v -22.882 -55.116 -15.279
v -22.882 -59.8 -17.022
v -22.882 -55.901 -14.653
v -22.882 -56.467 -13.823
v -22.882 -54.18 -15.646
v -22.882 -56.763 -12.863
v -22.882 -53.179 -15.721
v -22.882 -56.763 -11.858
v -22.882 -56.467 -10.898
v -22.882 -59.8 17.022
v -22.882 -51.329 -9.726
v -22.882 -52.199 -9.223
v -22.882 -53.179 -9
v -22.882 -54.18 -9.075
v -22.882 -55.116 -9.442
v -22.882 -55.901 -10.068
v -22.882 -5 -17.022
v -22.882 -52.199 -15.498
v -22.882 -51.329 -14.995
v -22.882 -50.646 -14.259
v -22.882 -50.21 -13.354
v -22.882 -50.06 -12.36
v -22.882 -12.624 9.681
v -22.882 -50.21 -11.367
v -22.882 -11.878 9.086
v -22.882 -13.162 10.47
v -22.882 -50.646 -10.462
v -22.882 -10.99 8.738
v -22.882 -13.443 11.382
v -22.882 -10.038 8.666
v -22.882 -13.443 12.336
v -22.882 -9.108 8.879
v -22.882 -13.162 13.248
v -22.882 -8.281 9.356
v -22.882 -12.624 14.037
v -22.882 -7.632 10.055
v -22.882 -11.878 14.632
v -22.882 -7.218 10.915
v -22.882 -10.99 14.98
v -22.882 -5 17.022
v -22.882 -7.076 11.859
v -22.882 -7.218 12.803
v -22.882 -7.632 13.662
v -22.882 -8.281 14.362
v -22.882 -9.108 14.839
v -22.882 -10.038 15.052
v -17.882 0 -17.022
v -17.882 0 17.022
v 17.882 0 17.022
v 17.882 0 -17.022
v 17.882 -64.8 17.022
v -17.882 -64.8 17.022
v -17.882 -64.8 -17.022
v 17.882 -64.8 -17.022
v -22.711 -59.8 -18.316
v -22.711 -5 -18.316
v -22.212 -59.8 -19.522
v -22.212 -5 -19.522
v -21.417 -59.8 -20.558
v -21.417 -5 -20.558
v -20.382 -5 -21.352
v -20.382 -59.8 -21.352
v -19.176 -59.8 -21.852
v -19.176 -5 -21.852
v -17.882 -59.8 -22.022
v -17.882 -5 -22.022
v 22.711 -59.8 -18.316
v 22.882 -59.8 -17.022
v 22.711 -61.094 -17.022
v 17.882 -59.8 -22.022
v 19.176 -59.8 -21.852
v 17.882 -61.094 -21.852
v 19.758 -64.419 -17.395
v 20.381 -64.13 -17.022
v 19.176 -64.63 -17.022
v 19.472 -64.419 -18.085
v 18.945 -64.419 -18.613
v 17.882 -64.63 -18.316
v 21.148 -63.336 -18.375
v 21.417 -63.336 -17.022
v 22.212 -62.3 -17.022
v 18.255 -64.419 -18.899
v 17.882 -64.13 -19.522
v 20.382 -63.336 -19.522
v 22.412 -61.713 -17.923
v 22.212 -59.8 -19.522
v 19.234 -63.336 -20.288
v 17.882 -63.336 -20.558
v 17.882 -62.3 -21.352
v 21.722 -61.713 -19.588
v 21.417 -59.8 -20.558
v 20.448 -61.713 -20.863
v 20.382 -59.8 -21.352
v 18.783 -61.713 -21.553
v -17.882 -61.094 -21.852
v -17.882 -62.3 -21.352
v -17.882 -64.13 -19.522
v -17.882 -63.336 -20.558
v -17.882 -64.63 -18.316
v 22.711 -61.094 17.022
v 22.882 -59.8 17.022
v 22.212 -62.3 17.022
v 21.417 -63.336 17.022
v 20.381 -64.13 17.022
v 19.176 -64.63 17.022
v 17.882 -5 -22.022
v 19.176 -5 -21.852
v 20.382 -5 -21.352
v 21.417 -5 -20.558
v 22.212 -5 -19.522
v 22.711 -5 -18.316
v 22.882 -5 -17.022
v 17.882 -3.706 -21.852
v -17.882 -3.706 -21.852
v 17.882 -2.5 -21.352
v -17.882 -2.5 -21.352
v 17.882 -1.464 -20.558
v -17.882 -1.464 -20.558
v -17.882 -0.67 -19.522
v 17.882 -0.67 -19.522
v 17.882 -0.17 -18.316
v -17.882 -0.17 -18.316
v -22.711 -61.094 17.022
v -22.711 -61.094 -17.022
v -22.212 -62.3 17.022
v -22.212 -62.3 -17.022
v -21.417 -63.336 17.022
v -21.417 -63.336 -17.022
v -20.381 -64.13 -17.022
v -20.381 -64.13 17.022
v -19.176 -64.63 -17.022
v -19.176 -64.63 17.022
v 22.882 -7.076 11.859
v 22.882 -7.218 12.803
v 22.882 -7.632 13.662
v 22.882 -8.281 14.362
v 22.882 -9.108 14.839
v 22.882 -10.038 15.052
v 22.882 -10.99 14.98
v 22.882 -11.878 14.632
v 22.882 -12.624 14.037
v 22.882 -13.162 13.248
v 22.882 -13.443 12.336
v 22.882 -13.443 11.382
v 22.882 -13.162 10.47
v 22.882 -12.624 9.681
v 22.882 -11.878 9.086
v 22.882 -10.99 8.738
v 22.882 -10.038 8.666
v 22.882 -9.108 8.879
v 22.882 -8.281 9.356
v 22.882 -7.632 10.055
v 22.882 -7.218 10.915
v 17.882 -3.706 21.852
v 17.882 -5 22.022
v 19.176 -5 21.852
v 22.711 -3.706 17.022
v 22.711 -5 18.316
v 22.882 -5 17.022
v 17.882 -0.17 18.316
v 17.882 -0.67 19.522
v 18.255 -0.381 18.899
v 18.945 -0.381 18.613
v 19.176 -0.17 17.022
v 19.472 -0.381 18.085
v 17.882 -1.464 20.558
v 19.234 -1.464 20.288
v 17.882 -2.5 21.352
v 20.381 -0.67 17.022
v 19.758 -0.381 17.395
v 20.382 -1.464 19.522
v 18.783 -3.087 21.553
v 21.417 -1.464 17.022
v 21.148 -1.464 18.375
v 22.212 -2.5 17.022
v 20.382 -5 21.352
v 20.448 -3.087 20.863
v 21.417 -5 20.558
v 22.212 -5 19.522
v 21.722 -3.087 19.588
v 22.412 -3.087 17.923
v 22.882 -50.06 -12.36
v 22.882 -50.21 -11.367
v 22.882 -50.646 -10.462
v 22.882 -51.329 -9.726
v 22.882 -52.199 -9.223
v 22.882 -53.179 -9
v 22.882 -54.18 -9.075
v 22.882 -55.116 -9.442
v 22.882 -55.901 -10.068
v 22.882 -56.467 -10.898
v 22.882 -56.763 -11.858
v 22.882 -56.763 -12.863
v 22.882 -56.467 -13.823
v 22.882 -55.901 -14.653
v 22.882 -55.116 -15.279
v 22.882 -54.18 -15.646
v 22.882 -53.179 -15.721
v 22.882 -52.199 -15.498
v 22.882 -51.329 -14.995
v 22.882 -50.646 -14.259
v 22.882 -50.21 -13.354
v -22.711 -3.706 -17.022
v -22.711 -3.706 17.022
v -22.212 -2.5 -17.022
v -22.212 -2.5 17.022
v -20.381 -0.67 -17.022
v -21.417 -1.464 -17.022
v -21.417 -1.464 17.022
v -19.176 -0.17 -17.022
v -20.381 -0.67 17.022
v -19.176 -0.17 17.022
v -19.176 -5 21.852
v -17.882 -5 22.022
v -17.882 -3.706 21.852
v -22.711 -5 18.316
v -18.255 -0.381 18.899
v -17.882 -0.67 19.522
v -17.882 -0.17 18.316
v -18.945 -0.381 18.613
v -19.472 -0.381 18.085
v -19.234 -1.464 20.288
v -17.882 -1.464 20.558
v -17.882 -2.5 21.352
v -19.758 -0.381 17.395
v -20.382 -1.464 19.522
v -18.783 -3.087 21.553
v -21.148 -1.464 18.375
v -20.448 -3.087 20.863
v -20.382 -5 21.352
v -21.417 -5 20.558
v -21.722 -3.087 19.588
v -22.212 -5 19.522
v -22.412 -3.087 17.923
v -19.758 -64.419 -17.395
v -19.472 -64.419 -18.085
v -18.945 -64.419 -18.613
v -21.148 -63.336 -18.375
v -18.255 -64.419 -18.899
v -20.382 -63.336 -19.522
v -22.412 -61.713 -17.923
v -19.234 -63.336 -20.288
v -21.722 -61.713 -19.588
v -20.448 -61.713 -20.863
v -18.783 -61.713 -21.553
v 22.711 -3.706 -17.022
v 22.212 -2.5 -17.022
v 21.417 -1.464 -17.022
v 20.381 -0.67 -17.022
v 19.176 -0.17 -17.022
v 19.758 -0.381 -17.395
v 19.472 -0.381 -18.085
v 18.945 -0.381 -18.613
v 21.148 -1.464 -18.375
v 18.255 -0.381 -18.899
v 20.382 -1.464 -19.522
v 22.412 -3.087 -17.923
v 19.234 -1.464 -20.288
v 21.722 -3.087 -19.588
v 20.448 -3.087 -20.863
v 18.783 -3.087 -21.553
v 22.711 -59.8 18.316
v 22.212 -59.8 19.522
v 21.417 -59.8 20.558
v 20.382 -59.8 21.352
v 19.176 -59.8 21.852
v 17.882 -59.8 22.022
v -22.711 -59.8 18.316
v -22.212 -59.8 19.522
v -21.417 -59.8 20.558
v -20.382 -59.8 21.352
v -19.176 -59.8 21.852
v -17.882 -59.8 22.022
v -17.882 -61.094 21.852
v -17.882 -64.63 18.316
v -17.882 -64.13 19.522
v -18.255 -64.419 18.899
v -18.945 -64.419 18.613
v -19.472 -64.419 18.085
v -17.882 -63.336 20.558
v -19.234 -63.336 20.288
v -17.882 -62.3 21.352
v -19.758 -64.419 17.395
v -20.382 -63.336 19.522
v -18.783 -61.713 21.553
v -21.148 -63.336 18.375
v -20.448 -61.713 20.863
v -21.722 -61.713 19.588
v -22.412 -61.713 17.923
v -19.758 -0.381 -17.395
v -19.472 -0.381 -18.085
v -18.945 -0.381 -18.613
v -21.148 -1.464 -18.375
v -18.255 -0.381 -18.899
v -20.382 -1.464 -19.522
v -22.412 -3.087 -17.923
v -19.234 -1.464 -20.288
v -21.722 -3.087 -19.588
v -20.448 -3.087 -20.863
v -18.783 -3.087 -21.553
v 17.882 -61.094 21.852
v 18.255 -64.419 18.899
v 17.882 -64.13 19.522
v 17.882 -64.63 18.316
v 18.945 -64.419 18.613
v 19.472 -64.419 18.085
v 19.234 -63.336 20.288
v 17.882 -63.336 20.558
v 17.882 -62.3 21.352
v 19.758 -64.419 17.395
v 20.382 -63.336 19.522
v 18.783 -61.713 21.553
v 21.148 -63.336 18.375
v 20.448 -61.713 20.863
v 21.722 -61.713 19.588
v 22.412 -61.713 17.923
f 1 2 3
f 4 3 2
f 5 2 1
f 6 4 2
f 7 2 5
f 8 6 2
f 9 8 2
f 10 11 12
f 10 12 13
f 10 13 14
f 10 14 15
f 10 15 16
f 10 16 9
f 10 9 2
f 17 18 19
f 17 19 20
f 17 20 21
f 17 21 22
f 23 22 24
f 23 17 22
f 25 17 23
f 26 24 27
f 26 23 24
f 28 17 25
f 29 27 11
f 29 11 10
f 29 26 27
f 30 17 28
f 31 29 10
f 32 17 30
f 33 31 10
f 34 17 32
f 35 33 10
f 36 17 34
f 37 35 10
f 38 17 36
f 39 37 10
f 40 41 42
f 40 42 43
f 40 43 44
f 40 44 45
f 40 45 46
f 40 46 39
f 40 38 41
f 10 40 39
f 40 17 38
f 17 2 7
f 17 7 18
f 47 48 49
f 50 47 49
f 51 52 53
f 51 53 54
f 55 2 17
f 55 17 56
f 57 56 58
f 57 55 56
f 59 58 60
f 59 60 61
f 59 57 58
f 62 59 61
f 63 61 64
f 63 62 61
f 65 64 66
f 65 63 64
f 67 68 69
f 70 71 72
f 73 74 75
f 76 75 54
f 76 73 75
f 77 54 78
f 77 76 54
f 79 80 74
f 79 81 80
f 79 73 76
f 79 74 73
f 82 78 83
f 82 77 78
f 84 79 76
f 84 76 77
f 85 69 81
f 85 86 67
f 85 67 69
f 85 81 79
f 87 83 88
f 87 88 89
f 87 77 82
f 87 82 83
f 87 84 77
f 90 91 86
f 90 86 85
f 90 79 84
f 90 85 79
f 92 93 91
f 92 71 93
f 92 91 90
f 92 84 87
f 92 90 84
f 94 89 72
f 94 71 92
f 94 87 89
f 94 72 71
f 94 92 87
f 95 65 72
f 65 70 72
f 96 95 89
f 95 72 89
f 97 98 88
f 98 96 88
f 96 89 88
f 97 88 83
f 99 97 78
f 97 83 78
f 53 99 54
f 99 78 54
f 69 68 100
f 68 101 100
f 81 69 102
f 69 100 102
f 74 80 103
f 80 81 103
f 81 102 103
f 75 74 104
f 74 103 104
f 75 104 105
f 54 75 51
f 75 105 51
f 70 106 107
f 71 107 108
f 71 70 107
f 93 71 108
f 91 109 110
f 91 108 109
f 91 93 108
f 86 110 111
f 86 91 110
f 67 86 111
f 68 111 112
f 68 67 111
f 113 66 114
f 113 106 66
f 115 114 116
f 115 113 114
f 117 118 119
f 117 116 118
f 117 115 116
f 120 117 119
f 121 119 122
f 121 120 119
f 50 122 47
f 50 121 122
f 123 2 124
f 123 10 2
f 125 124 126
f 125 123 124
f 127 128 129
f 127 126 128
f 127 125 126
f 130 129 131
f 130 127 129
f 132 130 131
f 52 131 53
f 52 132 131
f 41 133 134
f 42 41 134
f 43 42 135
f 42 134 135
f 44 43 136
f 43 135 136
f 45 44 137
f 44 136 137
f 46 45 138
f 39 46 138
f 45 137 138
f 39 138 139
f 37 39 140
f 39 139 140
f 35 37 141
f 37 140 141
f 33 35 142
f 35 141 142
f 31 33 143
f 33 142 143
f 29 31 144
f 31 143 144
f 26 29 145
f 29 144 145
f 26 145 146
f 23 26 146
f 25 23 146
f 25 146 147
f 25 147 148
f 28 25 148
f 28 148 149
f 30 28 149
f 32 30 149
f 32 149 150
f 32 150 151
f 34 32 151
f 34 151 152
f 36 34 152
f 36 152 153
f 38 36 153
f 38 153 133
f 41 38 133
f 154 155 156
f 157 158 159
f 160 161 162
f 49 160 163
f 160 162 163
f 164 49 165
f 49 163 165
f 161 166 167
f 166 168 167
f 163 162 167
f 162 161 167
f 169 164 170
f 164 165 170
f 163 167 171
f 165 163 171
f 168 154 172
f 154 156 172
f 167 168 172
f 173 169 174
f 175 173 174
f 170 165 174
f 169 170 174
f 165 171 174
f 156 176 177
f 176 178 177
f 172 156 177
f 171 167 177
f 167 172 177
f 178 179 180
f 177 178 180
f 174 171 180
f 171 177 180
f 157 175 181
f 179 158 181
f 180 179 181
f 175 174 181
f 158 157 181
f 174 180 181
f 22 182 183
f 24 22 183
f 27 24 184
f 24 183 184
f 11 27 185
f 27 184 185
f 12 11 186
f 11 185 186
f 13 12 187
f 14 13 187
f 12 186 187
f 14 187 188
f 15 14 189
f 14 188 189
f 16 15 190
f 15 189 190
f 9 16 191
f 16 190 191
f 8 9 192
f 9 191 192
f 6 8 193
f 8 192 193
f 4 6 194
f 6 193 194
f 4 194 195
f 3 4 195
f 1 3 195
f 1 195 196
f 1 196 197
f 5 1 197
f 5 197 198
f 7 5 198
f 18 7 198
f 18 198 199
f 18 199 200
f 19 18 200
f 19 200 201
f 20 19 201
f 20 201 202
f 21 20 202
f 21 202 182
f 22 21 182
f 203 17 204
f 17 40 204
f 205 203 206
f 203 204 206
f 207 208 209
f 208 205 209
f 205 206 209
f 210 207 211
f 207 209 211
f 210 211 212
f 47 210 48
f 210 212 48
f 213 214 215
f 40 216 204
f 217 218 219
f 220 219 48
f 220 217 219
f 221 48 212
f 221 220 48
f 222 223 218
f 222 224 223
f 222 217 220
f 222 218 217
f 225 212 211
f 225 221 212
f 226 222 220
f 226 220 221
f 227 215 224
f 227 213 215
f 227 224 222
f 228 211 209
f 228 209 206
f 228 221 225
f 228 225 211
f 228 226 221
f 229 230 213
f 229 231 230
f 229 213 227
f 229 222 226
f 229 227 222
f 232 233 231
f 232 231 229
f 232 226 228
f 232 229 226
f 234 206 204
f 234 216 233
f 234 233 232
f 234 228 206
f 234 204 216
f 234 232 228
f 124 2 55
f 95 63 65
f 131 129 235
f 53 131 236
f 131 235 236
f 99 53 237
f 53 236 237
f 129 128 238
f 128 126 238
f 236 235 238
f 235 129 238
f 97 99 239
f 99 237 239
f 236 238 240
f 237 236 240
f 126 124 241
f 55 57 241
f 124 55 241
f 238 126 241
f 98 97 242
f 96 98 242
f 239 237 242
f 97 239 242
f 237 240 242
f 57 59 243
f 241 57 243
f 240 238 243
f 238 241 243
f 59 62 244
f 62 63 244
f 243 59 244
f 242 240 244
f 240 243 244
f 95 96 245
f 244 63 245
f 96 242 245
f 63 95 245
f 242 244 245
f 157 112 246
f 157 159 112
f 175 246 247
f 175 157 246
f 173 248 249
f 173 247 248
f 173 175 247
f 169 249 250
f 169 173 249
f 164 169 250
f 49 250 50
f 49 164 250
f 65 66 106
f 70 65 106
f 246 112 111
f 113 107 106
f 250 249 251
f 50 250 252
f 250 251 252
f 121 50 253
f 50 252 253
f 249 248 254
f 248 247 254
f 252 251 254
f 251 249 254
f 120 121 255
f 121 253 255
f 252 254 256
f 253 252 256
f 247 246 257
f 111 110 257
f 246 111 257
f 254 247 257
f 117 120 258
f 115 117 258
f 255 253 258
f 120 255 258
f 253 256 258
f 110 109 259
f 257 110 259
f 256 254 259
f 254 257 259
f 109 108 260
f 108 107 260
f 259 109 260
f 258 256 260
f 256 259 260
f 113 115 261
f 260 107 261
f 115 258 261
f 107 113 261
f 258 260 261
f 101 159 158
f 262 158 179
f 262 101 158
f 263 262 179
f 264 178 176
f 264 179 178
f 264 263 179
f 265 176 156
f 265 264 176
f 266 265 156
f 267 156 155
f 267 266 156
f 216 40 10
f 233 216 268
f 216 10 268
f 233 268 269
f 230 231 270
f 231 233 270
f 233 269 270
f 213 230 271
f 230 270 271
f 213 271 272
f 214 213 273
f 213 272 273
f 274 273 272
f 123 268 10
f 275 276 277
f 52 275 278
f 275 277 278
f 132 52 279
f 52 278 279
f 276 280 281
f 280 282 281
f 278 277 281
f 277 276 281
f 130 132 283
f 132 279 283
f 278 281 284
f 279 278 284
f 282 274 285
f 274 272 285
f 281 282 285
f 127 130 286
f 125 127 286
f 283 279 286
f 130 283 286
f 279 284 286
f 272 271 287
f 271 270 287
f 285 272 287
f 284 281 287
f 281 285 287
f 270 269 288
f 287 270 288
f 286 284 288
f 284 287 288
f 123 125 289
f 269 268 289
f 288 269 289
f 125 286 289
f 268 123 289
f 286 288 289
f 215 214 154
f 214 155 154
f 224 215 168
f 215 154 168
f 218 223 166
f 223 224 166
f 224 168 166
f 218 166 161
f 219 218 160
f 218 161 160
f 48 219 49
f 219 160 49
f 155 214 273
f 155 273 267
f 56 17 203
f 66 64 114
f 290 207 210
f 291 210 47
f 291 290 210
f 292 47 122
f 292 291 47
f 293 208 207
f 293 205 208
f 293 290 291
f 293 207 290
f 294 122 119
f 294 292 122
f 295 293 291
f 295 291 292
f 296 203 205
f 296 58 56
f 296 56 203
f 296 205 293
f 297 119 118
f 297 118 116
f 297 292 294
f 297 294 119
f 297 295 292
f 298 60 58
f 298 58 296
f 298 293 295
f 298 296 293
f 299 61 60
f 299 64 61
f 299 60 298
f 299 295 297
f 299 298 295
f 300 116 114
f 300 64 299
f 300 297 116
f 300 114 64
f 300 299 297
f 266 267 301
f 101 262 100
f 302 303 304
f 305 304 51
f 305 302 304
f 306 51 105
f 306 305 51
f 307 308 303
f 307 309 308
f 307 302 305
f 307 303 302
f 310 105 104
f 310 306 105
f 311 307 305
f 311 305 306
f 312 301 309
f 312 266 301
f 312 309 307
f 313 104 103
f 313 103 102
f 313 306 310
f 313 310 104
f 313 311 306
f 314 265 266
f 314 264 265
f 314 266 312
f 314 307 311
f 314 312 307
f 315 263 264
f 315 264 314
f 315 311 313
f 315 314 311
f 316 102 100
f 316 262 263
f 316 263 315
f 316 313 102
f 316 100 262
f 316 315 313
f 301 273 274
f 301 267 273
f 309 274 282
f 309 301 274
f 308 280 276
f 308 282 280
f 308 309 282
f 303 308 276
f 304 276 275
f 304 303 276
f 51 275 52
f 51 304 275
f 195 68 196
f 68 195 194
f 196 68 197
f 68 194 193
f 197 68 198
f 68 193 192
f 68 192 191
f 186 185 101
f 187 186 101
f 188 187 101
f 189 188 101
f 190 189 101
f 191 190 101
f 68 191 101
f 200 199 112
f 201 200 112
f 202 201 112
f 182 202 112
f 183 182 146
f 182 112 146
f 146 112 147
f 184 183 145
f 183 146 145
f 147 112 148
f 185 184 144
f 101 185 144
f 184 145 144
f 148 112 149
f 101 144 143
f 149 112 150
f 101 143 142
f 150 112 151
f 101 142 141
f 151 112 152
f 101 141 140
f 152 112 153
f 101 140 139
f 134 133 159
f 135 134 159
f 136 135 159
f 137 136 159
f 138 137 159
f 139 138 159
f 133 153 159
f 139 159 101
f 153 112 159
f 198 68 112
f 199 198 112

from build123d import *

# Parameters (mm, degrees)
F0_W     = 45.763
F0_H     = 44.044
F1_DEPTH = 64.8
F2_R     = 5
F3_R     = 3.201525
F3_R_2   = 3.37016
F4_DEPTH = 124.6


with BuildPart() as f1:
    # F0 (on Front) → F1 (new body)
    with BuildSketch(Plane.XZ):
        Rectangle(F0_W, F0_H)
    extrude(amount=F1_DEPTH)

    # F2
    f2_edges = [f1.edges().sort_by_distance(p)[0] for p in [
        (22.8815, -32.4, 22.022),
        (-22.8815, -32.4, 22.022),
        (0, 0, 22.022),
        (0, -64.8, 22.022),
        (22.8815, -32.4, -22.022),
        (22.8815, 0, 0),
        (22.8815, -64.8, 0),
        (-22.8815, -32.4, -22.022),
        (-22.8815, 0, 0),
        (-22.8815, -64.8, 0),
        (0, 0, -22.022),
        (0, -64.8, -22.022),
    ]]
    fillet(f2_edges, radius=F2_R)

    # F3 (on face) → F4 (cut)
    with BuildSketch(Plane.YZ.offset(22.8815)):
        with Locations((-10.277459, 11.858958)):
            Circle(F3_R)
        with Locations((-53.430479, -12.360408)):
            Circle(F3_R_2)
    extrude(amount=-F4_DEPTH, mode=Mode.SUBTRACT)


solid = f1.part
